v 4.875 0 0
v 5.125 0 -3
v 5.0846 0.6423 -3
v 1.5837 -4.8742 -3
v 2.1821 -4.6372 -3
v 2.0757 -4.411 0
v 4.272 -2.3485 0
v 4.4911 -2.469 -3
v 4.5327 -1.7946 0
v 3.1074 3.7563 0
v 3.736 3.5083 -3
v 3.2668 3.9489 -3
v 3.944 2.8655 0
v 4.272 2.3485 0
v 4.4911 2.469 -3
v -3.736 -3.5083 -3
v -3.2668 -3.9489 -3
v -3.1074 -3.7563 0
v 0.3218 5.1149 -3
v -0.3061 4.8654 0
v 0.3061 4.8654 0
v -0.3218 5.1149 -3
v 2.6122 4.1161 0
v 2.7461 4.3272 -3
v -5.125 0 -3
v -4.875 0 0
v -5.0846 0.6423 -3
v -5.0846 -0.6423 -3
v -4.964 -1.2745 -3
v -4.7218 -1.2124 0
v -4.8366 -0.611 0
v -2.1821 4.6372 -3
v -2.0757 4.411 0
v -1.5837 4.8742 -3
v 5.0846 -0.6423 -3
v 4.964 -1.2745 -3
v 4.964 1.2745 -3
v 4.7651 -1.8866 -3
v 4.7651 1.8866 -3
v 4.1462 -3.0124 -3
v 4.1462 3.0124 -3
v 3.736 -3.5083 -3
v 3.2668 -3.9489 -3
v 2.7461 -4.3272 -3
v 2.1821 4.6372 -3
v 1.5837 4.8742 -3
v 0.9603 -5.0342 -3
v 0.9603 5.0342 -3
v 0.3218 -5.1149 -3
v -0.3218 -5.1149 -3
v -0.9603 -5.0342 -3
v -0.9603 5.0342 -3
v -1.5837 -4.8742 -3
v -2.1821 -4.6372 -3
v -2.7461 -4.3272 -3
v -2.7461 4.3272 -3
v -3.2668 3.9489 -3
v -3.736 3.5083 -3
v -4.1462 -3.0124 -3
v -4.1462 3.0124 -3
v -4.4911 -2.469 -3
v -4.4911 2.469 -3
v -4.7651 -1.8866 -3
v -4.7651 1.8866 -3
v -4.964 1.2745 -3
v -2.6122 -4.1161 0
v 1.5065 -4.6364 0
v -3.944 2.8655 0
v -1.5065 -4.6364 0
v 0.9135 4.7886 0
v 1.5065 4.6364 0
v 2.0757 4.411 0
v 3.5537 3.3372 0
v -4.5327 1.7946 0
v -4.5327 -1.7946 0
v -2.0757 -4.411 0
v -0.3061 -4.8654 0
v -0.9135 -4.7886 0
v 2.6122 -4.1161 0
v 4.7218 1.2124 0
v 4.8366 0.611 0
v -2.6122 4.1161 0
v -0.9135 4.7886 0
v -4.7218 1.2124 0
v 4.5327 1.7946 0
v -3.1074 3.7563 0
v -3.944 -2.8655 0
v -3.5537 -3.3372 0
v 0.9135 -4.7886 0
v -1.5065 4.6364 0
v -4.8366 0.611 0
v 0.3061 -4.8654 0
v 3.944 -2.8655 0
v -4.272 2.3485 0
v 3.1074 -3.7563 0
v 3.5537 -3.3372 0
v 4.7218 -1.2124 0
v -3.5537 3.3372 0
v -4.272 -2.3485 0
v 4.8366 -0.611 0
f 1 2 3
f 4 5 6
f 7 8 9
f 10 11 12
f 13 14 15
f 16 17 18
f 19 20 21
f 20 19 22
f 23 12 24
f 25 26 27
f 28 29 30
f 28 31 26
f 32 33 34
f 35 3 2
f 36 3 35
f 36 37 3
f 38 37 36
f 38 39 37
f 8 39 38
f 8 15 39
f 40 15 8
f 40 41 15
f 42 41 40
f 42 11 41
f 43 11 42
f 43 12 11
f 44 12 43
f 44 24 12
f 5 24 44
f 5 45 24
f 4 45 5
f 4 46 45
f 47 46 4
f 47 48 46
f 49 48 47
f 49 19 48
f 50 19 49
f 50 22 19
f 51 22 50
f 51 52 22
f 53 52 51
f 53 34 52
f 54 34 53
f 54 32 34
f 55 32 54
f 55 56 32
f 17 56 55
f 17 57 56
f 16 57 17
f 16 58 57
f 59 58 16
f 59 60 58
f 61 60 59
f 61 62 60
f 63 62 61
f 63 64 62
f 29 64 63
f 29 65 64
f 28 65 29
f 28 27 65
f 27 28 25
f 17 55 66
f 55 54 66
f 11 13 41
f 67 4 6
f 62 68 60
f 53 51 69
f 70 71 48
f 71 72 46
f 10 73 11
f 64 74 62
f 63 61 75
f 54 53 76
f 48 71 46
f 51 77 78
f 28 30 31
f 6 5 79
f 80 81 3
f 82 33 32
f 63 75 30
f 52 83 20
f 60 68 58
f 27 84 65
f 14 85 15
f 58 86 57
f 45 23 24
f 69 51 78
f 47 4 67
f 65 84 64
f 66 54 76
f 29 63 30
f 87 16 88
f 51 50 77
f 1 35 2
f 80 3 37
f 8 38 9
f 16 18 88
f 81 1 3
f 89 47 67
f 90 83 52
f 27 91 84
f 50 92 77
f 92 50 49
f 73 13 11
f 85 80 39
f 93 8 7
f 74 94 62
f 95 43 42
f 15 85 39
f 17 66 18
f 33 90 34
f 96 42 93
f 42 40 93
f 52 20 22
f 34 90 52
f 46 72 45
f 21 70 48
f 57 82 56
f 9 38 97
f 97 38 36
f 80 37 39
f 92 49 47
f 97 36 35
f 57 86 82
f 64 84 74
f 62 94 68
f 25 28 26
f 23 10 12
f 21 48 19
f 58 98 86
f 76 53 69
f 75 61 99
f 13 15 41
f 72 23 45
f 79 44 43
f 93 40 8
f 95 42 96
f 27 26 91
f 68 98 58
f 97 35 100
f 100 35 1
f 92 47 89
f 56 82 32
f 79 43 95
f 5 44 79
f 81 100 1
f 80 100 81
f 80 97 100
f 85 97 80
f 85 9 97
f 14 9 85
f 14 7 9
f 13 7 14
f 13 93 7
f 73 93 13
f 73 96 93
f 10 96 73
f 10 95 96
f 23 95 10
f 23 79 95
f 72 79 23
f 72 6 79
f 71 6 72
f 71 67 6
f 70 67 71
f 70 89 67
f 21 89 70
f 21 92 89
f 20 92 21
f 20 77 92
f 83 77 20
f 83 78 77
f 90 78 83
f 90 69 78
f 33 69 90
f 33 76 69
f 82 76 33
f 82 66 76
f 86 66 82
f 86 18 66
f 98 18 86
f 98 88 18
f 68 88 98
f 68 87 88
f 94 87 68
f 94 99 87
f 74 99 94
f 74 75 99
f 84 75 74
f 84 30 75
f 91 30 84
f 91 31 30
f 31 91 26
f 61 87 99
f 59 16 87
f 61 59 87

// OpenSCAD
$fn = 50;


difference() {
	union() {
		translate(v = [0, 0, -3.0000000000]) {
			cylinder(h = 3, r1 = 5.1250000000, r2 = 4.8750000000);
		}
	}
	union();
}
